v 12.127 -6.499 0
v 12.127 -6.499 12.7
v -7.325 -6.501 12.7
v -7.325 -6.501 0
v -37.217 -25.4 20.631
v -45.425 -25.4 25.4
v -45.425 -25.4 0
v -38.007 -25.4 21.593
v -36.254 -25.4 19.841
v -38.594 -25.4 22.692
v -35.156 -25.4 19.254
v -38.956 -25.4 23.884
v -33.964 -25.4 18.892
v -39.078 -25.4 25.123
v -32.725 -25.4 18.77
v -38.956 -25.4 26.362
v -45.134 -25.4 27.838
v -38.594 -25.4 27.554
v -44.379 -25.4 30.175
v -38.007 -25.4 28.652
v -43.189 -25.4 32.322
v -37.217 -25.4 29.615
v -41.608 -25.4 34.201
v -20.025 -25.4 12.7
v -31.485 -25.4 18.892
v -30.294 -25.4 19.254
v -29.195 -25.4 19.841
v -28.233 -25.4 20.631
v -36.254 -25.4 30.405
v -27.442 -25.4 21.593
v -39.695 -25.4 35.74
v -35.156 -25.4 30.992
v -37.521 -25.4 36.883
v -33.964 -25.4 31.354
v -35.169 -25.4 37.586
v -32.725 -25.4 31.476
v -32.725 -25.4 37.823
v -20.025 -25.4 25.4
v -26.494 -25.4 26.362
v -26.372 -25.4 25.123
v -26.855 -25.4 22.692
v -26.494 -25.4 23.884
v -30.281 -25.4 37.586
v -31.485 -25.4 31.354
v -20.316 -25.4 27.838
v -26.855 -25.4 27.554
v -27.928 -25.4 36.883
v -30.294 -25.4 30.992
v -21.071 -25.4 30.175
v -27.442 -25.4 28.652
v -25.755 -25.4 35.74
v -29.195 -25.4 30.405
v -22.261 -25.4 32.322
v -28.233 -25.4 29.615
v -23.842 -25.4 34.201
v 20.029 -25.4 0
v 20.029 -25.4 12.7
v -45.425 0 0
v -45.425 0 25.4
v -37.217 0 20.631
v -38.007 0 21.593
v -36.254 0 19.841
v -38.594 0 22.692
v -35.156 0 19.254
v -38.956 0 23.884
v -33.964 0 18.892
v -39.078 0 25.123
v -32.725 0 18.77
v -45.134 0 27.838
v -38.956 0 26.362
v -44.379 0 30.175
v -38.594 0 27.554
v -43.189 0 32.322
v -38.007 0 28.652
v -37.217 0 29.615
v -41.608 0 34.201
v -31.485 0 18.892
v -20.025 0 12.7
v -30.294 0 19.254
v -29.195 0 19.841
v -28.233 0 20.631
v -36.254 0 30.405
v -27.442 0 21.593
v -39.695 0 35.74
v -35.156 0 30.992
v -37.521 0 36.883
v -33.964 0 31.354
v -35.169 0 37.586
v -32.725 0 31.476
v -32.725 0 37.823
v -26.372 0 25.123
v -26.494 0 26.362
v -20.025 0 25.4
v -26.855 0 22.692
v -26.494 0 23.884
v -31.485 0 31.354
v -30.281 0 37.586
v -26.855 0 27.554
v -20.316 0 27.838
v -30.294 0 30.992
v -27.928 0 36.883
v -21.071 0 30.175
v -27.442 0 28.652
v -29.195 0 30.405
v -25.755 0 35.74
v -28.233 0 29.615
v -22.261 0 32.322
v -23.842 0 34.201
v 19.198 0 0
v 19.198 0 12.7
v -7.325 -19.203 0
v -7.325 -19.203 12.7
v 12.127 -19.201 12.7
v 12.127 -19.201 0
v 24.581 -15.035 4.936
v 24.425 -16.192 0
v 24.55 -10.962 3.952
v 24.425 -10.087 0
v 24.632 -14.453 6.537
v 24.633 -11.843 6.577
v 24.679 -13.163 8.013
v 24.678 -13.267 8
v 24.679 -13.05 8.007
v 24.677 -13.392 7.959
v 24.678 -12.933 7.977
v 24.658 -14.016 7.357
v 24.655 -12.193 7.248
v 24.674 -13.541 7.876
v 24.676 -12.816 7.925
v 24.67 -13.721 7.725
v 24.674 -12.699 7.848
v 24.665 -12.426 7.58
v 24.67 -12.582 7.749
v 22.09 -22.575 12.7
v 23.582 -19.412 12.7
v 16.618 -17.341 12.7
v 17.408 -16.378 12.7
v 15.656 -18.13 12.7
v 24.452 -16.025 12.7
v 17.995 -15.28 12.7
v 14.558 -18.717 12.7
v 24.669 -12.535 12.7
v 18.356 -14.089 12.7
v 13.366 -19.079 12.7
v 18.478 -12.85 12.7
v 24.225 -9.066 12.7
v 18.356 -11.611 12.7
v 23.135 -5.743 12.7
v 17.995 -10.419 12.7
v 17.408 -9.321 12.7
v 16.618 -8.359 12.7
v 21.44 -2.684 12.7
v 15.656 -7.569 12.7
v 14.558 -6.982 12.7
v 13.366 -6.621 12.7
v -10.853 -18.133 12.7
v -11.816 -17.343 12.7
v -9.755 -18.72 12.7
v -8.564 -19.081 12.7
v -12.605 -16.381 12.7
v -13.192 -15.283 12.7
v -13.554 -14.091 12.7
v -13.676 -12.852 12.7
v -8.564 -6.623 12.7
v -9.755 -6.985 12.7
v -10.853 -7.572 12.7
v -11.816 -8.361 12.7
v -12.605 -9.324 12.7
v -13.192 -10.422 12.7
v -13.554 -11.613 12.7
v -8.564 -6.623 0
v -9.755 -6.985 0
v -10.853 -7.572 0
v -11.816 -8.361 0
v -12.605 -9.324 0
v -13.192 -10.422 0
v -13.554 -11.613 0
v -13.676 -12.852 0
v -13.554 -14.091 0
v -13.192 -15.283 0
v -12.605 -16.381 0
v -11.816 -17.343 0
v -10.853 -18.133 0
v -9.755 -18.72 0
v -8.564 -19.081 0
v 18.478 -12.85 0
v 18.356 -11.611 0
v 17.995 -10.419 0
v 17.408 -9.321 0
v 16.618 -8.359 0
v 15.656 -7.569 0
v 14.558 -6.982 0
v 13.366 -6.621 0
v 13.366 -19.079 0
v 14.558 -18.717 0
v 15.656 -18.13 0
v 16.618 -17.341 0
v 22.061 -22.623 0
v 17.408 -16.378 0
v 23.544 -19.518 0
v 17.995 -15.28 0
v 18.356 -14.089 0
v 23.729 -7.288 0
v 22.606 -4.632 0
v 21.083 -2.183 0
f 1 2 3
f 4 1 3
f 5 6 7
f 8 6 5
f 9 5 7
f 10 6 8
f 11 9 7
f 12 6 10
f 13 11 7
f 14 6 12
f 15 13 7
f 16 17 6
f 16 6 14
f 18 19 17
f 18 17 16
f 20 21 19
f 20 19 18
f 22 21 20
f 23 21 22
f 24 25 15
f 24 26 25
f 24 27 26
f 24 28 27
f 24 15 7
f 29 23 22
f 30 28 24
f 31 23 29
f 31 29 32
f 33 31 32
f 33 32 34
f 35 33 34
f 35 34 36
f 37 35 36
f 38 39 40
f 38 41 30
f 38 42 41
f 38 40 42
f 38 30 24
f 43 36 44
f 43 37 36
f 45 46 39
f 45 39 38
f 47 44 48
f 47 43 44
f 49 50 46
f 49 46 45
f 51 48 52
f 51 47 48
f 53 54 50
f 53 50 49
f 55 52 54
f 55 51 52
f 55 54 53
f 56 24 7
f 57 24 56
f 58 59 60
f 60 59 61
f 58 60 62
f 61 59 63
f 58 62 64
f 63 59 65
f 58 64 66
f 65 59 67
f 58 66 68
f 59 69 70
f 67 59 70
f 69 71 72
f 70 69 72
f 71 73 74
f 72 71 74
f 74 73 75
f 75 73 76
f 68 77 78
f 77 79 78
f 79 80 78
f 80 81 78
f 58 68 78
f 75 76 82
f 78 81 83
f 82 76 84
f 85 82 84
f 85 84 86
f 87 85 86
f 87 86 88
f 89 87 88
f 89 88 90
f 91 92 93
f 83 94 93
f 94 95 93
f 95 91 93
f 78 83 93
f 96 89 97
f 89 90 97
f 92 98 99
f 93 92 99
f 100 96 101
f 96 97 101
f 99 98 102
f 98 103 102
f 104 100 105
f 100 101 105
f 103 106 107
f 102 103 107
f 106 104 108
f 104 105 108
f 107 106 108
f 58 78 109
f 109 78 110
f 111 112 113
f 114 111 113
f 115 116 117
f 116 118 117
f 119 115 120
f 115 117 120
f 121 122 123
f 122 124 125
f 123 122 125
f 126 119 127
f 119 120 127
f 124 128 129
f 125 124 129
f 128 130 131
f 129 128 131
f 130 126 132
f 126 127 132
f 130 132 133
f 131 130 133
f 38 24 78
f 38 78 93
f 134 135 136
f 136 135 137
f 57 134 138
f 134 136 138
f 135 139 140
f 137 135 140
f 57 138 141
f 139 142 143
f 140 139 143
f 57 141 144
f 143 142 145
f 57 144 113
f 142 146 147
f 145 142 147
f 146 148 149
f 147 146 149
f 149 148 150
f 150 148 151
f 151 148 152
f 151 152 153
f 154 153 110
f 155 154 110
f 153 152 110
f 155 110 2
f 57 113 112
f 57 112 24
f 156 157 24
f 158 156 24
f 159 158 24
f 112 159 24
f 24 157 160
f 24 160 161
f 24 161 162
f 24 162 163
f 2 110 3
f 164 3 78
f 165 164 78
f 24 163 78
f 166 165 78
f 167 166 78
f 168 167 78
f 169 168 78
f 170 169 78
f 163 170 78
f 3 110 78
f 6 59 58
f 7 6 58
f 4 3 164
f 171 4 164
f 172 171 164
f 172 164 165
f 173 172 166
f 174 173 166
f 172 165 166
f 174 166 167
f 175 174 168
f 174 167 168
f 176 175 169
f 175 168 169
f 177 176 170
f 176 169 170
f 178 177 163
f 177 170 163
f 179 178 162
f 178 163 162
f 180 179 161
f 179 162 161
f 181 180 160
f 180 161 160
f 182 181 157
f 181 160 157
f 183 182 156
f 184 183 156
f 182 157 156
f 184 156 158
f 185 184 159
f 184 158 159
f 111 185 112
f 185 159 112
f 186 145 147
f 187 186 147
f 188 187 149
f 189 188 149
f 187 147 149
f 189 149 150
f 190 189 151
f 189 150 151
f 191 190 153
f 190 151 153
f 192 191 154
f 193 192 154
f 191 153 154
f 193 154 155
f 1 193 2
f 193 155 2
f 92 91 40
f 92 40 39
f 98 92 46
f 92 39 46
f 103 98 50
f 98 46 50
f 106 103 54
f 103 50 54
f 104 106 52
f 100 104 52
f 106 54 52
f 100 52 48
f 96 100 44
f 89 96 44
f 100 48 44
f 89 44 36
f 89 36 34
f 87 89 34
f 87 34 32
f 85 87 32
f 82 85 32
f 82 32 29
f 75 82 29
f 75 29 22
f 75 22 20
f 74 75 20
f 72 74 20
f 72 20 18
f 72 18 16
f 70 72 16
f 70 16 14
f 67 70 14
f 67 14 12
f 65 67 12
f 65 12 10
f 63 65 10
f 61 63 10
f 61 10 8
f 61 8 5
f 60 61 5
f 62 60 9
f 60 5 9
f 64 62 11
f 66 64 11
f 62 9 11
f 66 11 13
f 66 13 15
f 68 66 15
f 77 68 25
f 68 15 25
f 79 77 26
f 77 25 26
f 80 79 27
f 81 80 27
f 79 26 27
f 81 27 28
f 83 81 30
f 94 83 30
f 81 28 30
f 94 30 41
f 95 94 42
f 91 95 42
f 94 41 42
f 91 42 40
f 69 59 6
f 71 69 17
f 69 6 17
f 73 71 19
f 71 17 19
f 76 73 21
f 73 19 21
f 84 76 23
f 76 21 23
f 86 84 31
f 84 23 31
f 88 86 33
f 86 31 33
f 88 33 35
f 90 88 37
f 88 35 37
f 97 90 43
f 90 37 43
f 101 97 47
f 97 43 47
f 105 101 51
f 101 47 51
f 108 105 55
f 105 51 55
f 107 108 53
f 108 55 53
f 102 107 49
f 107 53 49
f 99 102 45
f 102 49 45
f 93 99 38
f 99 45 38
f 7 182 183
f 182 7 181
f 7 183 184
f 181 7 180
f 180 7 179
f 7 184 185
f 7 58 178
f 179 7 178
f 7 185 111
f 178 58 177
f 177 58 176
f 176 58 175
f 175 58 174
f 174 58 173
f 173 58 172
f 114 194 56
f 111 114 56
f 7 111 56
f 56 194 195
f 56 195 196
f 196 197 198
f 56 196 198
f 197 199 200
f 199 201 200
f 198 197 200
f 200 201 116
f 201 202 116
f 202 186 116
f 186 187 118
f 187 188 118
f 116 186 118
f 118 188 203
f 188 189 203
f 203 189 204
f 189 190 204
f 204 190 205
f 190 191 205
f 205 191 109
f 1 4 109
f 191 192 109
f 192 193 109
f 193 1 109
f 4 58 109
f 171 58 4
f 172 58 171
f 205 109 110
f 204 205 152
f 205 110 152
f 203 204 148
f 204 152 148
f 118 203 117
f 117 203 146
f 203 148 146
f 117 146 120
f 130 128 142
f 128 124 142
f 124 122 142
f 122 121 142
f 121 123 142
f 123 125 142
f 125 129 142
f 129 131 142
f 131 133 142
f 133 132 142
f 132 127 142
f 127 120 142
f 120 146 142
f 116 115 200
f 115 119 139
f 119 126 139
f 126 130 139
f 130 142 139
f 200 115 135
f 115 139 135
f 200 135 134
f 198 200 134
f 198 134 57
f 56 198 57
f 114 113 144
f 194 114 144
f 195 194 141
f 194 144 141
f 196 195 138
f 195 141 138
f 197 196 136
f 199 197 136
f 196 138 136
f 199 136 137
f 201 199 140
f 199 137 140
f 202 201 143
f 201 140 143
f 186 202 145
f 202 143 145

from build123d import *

# Parameters (mm, degrees)
F1_DEPTH = 25.4
F3_DEPTH = 25.401
F4_R     = 6.353022
F5_DEPTH = 25.401
F8_DEPTH = 25.4
F9_DEPTH = 25.4


with BuildPart() as f1:
    # F0 (on Front) → F1 (new body)
    with BuildSketch(Plane.XZ):
        Polygon((-20.024838, 38.1), (-45.424838, 38.1), (-45.424838, 0), (24.425162, 0), (24.827223, 12.7), (-20.024838, 12.7), align=None)
    extrude(amount=F1_DEPTH)

    # F2 (on face) → F3 (cut, through all)
    with BuildSketch(Plane.XZ.offset(25.4)):
        with BuildLine():
            ThreePointArc((-45.424838, 25.4), (-32.724838, 37.822931), (-20.024838, 25.4))
            Line((-20.024838, 25.4), (-20.024838, 38.1))
            Line((-20.024838, 38.1), (-45.424838, 38.1))
            Line((-45.424838, 38.1), (-45.424838, 25.4))
        make_face()
    extrude(amount=-F3_DEPTH, mode=Mode.SUBTRACT)

    # F4 (on face) → F5 (cut, through all)
    with BuildSketch(Plane.XZ.offset(25.4)):
        with Locations((-32.724838, 25.122931)):
            Circle(F4_R)
    extrude(amount=-F5_DEPTH, mode=Mode.SUBTRACT)

    # F7 (on face) → F8 (cut)
    with BuildSketch(Plane.XY.offset(12.7)):
        with BuildLine():
            ThreePointArc((-7.324838, -19.203114), (-2.834065, -17.342975), (-0.973926, -12.852202))
            ThreePointArc((-0.973926, -12.852202), (-2.834065, -8.361429), (-7.324838, -6.50129))
            ThreePointArc((-7.324838, -6.50129), (-13.67575, -12.852202), (-7.324838, -19.203114))
        make_face()
        with BuildLine():
            ThreePointArc((-7.324838, -6.50129), (-2.834065, -8.361429), (-0.973926, -12.852202))
            ThreePointArc((-0.973926, -12.852202), (-2.834065, -17.342975), (-7.324838, -19.203114))
            Line((-7.324838, -19.203114), (12.127223, -19.200703))
            ThreePointArc((12.127223, -19.200703), (5.77634, -12.849819), (12.127223, -6.498936))
            Line((12.127223, -6.498936), (-7.324838, -6.50129))
        make_face()
        with BuildLine():
            ThreePointArc((18.478107, -12.849819), (16.617976, -8.359066), (12.127223, -6.498936))
            ThreePointArc((12.127223, -6.498936), (5.77634, -12.849819), (12.127223, -19.200703))
            ThreePointArc((12.127223, -19.200703), (16.617976, -17.340572), (18.478107, -12.849819))
        make_face()
    extrude(amount=-F8_DEPTH, mode=Mode.SUBTRACT)

    # F7 (on face) → F9 (cut)
    with BuildSketch(Plane.XY.offset(12.7)):
        with BuildLine():
            ThreePointArc((19.19838, 0), (24.668979, -12.534609), (20.029411, -25.4))
            Line((20.029411, -25.4), (24.827223, -25.4))
            Line((24.827223, -25.4), (24.827223, 0))
            Line((24.827223, 0), (19.19838, 0))
        make_face()
    extrude(amount=-F9_DEPTH, mode=Mode.SUBTRACT)


solid = f1.part
